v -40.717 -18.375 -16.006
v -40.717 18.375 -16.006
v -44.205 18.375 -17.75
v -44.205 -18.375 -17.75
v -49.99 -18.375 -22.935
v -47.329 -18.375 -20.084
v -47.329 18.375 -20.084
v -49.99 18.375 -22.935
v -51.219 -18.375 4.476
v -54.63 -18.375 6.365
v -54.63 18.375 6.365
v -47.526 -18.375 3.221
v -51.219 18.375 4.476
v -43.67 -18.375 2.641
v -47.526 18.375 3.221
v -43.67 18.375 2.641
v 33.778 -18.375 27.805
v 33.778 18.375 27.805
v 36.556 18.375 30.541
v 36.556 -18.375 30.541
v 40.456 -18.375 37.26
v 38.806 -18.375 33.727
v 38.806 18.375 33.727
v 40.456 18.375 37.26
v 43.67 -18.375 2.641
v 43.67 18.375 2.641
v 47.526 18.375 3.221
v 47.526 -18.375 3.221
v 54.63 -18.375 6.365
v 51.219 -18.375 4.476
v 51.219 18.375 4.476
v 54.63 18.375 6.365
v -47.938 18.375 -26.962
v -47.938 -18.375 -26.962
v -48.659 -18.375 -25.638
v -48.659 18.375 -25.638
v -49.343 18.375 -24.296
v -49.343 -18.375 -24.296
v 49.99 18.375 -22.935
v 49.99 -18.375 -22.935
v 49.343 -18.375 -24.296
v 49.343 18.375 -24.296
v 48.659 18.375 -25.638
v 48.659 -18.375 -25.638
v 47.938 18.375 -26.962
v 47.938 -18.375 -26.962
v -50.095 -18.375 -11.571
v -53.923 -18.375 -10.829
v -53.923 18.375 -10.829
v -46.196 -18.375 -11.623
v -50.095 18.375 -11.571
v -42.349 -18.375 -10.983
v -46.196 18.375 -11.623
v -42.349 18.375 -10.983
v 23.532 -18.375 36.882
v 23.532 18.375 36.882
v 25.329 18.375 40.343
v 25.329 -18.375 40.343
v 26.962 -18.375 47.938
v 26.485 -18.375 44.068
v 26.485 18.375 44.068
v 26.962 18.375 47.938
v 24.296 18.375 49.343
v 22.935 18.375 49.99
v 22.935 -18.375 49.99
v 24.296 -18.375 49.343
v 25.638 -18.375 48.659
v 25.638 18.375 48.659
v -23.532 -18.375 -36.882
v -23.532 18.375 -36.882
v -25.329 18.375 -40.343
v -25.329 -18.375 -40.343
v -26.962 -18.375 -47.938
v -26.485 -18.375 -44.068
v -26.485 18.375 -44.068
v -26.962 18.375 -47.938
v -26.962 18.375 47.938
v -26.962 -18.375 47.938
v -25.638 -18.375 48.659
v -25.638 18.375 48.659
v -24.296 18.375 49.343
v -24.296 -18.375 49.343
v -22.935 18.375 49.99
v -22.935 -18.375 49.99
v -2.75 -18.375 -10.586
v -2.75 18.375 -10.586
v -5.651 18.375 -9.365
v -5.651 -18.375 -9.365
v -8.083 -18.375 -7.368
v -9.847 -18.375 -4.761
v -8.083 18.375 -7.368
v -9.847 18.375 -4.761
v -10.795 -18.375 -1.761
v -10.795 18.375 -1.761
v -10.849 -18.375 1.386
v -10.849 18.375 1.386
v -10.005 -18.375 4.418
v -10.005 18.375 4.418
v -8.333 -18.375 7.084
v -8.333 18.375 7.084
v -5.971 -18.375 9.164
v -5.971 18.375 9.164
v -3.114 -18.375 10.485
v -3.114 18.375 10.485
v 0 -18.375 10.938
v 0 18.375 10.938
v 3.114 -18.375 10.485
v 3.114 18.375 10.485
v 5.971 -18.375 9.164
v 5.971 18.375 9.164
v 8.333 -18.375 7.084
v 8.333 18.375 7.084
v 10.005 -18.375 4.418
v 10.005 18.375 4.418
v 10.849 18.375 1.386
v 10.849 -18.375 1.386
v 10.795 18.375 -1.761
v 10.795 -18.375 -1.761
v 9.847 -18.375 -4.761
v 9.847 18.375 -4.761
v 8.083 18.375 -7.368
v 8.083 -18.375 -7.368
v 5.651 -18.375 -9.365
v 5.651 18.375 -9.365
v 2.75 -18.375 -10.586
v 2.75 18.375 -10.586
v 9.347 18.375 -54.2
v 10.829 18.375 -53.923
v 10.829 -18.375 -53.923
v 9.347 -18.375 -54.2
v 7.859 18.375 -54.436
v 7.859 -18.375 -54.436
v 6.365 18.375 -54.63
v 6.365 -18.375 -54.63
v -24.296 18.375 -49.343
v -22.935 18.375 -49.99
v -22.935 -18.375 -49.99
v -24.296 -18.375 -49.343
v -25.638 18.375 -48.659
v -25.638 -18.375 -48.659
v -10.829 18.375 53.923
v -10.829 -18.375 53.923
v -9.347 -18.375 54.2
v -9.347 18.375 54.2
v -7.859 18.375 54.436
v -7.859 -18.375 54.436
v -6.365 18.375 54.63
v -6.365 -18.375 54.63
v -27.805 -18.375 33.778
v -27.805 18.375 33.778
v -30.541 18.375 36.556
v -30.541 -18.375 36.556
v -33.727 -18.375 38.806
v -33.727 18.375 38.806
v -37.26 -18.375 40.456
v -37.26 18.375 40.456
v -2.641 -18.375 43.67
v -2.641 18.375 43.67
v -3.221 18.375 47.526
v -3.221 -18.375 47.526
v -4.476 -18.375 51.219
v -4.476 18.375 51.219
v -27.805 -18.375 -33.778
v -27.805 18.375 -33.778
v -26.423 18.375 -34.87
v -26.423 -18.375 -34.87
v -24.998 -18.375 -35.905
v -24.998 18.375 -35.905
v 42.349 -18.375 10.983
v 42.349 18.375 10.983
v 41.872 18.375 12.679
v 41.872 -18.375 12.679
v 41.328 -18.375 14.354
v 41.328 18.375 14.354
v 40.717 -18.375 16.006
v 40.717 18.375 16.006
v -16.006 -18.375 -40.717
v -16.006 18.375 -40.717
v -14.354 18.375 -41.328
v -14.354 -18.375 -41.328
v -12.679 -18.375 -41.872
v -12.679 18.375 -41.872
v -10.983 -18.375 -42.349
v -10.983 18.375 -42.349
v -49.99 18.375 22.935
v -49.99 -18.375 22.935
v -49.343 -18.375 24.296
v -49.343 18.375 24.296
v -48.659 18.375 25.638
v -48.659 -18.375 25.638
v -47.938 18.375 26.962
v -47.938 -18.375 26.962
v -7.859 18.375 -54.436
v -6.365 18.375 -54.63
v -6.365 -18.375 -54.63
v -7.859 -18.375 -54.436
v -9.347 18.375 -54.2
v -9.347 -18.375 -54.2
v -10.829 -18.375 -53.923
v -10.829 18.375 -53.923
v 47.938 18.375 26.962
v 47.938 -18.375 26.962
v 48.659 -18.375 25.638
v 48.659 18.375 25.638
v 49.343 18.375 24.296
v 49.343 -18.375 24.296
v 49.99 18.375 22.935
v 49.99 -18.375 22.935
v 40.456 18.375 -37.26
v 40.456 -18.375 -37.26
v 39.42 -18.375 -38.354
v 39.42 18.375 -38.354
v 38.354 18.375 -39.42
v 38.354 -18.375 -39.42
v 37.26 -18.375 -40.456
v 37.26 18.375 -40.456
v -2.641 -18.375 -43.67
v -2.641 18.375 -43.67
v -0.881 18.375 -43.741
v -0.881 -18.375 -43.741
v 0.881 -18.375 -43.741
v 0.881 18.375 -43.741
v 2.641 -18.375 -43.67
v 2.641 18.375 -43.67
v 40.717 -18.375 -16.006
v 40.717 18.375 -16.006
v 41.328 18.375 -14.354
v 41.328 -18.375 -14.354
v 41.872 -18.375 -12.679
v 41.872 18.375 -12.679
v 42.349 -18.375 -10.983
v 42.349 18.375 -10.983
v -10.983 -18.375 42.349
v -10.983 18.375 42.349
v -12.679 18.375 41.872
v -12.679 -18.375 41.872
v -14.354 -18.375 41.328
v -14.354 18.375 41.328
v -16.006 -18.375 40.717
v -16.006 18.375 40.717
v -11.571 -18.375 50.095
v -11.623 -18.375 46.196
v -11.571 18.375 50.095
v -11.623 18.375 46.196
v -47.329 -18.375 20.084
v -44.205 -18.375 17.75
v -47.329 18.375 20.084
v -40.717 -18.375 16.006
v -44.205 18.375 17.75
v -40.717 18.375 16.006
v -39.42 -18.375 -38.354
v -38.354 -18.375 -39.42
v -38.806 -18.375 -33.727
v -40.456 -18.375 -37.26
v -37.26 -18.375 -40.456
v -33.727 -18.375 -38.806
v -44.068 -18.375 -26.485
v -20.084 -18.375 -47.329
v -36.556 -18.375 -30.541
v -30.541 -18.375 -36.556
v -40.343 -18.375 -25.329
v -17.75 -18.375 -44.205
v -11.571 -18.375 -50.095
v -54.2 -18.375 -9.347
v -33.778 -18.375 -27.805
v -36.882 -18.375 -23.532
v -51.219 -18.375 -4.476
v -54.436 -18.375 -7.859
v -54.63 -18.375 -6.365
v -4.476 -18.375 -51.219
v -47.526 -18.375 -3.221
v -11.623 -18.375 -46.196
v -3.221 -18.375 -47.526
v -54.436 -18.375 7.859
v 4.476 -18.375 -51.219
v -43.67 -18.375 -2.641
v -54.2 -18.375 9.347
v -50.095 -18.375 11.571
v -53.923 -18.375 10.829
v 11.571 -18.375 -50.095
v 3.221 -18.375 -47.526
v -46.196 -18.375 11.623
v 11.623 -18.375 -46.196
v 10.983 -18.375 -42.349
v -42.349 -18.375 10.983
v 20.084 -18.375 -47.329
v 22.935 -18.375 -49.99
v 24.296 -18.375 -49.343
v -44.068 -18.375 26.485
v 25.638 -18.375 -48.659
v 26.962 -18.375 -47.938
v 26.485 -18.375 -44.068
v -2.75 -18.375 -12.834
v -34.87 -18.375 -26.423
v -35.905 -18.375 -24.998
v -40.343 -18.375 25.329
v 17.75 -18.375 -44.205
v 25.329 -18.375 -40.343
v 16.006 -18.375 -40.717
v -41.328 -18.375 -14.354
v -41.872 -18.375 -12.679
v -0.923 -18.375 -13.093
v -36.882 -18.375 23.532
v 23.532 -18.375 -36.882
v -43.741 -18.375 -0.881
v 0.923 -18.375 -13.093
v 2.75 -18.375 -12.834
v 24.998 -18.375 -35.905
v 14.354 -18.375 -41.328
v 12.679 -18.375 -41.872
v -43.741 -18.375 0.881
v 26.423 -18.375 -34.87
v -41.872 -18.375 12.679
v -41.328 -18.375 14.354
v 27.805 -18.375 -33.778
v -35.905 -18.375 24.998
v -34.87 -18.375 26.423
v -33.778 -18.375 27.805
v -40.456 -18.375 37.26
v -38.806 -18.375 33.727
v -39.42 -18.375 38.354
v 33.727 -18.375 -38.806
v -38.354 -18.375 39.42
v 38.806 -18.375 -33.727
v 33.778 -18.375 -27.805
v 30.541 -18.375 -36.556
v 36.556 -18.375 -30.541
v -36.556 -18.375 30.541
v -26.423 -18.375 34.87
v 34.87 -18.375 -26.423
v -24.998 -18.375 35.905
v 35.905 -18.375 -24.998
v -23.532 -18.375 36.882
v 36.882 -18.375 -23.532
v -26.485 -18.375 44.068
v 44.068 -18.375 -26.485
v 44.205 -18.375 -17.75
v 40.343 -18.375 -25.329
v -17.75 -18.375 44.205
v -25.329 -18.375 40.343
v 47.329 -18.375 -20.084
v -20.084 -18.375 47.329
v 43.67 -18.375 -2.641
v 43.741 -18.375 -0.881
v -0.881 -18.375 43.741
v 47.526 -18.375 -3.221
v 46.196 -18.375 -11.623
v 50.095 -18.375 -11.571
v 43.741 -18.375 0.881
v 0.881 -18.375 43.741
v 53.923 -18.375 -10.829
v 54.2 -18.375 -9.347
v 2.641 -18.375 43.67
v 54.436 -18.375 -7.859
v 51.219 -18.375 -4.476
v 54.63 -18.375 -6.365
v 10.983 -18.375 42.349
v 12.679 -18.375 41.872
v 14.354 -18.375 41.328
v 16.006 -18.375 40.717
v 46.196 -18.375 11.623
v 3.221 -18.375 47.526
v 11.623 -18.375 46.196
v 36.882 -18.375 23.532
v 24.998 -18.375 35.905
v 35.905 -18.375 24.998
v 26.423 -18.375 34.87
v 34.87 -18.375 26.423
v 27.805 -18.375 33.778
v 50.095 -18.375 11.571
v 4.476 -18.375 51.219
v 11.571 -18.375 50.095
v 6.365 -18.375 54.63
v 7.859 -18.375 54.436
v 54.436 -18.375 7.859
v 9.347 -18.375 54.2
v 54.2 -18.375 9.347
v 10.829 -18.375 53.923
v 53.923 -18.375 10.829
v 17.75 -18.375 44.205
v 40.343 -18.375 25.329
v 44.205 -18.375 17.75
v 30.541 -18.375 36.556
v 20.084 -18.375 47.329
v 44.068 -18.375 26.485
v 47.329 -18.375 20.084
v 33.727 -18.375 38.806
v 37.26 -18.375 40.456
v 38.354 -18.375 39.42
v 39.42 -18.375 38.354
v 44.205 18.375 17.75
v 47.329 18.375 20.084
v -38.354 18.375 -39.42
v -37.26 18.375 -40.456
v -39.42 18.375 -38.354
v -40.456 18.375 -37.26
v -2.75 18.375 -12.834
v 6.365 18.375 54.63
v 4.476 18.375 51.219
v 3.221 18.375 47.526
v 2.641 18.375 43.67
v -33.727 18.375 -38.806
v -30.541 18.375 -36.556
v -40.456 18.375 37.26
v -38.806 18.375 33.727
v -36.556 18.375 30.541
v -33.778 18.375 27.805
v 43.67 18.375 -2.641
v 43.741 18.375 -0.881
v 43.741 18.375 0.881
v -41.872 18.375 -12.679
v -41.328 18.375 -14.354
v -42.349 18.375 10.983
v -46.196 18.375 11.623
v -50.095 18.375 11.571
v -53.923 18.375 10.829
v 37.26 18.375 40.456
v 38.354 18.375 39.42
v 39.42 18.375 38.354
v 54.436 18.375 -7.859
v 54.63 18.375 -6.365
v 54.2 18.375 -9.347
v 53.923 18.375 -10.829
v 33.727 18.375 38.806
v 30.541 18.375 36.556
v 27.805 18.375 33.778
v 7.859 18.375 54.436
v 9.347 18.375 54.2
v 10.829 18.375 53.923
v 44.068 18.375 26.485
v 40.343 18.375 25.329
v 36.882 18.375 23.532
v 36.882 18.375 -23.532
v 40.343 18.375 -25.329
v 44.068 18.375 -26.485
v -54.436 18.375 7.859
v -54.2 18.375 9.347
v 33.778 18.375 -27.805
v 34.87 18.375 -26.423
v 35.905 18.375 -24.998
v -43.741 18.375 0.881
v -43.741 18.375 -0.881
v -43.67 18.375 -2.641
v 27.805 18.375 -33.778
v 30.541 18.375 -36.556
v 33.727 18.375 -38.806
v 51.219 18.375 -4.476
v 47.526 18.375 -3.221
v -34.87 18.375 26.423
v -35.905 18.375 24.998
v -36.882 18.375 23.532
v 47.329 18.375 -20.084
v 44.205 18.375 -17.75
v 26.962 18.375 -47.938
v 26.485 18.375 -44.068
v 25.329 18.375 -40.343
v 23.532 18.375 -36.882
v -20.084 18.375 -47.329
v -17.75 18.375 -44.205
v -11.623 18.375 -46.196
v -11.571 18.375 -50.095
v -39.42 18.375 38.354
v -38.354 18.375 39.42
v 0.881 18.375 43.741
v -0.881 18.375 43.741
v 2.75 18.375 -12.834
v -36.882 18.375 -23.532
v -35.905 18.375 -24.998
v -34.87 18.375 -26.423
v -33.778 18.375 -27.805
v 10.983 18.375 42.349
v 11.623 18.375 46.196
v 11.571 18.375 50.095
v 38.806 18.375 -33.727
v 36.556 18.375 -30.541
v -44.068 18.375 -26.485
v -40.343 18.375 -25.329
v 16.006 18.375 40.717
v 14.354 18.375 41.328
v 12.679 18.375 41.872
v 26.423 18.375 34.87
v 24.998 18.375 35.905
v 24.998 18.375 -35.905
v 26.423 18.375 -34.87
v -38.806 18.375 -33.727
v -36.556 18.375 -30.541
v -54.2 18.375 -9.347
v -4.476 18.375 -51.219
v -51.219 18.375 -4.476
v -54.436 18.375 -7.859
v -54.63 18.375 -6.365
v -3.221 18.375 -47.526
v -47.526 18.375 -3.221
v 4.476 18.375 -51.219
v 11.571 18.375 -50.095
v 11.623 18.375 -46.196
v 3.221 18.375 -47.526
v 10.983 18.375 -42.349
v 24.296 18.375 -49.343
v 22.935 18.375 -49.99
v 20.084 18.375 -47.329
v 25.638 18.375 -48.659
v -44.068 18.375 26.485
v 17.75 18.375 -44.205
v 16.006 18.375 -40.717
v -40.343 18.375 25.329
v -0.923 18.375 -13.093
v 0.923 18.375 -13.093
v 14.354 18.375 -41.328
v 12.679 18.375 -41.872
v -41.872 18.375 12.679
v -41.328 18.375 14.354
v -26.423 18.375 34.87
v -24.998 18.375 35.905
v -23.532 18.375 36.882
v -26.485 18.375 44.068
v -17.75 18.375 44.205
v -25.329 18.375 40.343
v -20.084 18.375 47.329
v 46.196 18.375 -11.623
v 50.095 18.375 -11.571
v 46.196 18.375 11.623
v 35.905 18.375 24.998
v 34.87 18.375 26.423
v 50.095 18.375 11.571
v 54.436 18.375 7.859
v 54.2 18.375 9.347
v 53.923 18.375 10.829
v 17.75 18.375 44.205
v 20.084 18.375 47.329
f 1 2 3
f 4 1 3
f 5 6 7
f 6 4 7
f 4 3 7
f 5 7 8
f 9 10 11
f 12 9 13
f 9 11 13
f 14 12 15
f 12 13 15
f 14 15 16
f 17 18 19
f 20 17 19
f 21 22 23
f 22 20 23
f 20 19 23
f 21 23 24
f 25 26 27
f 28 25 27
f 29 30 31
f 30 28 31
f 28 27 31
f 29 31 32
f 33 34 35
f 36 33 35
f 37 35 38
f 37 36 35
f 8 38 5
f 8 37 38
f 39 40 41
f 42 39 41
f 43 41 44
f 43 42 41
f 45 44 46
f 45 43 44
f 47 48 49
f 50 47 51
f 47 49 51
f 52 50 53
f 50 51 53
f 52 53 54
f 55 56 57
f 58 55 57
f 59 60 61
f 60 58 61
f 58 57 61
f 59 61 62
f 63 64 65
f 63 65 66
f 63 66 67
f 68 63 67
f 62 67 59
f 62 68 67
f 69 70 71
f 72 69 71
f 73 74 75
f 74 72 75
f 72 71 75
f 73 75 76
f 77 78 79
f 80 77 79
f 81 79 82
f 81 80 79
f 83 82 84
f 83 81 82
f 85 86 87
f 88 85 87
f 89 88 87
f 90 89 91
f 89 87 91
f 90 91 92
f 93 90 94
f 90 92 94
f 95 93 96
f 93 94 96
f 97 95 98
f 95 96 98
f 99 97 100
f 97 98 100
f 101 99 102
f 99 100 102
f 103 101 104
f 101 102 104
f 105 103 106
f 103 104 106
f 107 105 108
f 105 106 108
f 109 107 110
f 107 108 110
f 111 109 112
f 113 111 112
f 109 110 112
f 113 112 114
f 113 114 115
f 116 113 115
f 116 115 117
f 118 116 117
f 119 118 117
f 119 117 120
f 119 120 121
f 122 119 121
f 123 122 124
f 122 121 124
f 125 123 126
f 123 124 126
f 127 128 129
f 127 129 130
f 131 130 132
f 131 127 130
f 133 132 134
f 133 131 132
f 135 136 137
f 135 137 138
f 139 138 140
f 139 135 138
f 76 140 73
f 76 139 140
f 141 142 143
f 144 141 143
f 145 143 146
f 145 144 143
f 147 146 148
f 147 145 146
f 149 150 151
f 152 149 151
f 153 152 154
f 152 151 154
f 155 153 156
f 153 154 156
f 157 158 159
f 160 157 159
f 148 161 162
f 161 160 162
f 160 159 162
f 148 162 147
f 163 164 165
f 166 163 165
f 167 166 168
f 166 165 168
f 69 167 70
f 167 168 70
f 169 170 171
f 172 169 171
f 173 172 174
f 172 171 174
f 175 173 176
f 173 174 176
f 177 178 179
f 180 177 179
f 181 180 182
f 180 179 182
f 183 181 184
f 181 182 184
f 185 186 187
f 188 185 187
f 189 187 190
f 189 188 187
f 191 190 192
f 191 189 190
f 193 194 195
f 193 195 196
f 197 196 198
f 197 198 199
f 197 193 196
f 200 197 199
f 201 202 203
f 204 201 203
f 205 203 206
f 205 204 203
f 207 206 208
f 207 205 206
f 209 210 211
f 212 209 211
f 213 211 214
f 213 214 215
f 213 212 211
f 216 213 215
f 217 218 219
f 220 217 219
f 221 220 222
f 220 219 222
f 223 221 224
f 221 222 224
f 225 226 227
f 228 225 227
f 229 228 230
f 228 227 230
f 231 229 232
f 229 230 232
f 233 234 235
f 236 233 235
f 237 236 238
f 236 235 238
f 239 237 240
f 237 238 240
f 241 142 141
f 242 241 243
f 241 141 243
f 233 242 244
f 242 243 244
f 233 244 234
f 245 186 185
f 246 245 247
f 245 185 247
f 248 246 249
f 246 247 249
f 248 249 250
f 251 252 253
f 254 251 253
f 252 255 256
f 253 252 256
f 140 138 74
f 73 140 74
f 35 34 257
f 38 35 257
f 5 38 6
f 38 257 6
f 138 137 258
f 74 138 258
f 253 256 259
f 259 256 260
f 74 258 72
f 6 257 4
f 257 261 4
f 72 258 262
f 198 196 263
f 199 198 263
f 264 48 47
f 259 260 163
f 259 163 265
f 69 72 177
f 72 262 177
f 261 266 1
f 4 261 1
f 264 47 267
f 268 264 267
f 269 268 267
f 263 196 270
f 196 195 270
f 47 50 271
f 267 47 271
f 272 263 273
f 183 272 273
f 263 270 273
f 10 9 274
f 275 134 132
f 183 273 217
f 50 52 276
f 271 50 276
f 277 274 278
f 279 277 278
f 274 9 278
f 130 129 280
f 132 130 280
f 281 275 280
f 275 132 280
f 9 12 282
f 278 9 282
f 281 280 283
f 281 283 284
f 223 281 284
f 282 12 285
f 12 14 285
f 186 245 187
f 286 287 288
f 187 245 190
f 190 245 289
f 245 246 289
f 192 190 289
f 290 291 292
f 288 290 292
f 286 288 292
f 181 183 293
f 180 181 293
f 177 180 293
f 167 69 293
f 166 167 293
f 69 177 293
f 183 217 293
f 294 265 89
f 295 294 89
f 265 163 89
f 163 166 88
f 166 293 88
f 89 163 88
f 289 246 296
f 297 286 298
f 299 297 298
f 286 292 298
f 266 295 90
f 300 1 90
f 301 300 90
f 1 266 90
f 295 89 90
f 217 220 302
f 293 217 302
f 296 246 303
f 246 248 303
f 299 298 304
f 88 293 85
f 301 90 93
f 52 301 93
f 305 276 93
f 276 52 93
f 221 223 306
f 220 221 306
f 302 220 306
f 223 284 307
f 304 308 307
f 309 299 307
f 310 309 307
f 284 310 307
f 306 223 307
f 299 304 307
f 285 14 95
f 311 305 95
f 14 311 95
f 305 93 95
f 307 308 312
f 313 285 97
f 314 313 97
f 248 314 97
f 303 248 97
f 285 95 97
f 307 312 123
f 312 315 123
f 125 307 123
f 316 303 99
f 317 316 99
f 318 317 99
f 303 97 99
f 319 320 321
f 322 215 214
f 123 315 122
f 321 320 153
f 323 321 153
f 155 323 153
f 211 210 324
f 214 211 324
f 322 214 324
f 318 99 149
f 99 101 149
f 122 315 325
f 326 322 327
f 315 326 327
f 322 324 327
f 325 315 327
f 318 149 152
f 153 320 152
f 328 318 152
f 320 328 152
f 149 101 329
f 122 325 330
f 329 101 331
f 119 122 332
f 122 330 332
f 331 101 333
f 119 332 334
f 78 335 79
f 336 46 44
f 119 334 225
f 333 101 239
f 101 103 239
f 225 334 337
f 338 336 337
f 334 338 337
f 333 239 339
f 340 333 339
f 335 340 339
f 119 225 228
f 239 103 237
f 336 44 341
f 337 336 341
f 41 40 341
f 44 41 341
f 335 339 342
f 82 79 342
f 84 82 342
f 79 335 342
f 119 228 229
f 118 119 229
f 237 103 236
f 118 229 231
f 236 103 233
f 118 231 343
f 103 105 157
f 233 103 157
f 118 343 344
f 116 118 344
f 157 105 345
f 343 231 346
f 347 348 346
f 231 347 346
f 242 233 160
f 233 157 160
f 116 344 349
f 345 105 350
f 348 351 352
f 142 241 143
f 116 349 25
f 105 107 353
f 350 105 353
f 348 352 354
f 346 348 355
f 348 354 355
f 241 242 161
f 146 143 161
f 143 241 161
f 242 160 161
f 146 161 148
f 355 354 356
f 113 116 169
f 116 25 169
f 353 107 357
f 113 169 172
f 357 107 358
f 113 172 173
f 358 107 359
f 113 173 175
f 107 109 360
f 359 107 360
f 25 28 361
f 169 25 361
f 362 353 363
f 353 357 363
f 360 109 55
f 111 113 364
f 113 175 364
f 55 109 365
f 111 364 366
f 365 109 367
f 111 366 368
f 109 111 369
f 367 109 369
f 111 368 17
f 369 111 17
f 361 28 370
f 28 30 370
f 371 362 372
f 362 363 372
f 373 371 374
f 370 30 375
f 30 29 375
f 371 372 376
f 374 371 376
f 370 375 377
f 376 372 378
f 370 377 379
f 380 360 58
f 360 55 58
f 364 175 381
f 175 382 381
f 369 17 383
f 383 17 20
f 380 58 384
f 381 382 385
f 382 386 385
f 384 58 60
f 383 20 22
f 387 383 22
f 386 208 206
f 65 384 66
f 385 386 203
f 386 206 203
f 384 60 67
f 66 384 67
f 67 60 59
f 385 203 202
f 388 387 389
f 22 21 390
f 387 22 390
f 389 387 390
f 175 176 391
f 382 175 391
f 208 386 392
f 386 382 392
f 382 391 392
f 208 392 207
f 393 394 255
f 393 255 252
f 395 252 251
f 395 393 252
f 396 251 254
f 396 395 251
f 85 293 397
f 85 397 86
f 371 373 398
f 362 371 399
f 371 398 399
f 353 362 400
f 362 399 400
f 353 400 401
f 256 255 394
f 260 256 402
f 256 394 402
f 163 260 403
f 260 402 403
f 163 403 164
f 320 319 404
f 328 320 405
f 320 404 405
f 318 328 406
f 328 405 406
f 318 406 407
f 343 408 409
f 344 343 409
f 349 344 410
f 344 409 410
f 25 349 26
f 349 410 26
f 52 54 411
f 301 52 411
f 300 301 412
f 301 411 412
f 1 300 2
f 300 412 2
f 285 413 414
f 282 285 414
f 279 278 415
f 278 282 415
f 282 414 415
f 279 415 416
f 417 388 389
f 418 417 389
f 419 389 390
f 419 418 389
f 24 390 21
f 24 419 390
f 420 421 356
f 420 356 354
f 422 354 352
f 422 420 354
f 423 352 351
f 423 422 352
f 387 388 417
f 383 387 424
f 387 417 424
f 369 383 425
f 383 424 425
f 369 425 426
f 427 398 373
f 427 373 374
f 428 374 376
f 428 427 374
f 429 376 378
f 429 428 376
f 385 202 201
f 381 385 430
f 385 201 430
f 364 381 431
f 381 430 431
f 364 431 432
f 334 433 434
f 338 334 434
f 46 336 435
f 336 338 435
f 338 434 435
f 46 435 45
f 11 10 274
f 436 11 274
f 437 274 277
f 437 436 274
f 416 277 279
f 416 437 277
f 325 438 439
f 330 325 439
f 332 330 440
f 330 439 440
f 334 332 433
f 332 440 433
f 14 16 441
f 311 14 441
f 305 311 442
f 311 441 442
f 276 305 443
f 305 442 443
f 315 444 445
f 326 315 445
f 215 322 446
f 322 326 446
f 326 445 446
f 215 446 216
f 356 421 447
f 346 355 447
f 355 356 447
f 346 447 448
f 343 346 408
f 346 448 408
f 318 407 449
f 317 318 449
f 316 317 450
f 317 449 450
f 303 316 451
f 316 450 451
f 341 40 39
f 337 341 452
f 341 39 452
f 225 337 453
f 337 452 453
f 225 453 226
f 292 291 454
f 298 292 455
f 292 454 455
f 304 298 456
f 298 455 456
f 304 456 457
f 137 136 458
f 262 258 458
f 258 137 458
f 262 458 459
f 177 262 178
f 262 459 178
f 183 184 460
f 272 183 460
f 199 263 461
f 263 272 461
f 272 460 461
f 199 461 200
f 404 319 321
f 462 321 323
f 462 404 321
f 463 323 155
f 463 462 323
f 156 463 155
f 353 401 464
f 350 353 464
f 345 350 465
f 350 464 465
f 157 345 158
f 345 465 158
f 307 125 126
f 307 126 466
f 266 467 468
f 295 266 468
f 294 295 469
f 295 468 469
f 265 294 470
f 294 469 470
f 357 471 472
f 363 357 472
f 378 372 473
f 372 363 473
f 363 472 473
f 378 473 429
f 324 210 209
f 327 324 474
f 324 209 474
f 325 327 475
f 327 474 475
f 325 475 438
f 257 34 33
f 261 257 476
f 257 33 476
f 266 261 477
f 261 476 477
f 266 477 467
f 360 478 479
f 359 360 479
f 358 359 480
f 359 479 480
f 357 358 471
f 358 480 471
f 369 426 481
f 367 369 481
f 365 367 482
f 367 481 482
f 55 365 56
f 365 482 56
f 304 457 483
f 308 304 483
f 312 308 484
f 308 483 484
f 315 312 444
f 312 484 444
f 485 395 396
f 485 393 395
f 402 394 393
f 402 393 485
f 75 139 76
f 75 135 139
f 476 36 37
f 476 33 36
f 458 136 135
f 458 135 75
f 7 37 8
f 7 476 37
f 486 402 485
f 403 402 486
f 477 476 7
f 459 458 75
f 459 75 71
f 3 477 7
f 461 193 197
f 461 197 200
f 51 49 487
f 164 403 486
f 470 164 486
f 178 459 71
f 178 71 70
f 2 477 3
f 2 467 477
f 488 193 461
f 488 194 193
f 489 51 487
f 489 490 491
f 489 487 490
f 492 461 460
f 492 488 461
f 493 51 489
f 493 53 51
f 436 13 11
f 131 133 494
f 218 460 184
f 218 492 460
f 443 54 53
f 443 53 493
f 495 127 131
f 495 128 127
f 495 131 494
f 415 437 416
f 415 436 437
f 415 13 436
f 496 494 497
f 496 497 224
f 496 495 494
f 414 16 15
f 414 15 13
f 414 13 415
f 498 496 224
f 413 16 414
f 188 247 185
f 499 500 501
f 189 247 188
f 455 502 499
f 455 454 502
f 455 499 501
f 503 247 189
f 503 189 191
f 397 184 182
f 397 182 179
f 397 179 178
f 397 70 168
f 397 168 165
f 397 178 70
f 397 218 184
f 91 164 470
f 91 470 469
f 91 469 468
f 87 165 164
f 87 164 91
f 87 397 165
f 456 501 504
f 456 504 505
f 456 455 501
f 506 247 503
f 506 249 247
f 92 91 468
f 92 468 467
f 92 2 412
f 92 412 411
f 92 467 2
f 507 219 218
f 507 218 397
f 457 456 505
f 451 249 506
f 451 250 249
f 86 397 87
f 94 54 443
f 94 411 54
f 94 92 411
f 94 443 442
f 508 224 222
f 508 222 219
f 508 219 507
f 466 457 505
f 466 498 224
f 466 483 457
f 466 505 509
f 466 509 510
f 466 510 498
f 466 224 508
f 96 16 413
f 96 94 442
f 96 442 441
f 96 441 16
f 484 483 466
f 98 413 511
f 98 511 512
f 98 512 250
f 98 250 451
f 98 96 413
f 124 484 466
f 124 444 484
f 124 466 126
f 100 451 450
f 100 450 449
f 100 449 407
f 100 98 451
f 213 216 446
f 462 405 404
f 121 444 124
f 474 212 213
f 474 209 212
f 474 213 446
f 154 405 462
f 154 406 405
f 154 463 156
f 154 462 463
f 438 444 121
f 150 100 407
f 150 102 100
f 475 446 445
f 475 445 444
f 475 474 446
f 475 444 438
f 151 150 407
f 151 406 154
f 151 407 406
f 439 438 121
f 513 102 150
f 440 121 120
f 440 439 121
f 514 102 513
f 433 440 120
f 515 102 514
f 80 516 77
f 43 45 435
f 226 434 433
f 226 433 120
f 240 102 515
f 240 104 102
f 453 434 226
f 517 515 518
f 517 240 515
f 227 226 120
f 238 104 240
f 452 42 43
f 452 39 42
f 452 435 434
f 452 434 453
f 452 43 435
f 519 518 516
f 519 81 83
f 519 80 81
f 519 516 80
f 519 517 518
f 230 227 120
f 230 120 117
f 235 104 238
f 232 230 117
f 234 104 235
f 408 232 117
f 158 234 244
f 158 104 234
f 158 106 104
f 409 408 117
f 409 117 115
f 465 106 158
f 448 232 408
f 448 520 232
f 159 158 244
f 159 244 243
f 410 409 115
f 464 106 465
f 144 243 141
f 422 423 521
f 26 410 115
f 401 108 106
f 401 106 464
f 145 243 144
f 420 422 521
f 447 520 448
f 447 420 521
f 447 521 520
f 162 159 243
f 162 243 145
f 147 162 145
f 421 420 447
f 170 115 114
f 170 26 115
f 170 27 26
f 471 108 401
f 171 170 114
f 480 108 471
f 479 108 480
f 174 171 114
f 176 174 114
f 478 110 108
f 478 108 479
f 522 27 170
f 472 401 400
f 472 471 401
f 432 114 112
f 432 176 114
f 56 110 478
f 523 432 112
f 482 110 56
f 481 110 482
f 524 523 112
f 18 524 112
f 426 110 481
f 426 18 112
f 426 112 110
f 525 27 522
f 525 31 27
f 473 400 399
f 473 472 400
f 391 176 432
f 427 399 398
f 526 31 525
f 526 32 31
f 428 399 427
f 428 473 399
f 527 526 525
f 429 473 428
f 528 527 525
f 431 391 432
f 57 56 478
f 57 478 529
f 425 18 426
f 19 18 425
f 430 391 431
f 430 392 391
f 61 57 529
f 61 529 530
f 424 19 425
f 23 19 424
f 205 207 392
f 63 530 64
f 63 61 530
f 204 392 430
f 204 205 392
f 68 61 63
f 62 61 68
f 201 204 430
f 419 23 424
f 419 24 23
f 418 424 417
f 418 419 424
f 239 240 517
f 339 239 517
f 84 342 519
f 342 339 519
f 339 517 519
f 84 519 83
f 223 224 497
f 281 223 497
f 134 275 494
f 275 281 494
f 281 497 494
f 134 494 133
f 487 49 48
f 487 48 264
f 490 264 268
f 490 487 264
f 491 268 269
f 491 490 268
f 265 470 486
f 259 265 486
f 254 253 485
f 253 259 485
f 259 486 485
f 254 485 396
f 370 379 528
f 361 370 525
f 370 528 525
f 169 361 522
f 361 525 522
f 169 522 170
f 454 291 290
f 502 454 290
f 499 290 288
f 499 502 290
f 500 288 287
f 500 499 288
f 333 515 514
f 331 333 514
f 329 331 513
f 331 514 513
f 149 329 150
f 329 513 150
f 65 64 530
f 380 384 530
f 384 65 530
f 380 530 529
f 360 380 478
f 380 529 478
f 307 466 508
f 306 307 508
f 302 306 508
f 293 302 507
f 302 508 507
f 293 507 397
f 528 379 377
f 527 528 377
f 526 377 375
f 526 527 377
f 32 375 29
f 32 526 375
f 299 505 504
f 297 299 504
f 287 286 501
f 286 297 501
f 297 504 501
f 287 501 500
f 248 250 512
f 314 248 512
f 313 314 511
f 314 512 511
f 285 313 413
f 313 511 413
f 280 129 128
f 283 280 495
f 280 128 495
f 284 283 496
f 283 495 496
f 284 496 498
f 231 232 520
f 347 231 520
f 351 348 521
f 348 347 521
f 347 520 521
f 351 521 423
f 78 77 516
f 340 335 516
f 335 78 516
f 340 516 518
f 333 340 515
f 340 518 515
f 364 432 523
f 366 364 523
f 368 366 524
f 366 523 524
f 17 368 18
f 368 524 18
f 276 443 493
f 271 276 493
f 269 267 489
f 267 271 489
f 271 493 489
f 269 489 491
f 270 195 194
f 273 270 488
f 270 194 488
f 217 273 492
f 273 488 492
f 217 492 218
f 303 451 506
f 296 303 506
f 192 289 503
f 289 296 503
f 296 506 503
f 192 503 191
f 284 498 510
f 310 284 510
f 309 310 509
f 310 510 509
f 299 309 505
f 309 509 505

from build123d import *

# Parameters (mm, degrees)
IZIM4_R                     = 55
Y_KSEKLIK_EKSTR_ZYON1_DEPTH = 18.375
KES_EKSTR_ZYON2_DEPTH       = 25
DAIRESEL_KAPLAMA2_COUNT     = 20
KES_EKSTR_ZYON3_DEPTH       = 36.75


with BuildPart() as part:
    # Çizim4 → Yükseklik-Ekstrüzyon1 (new, symmetric)
    with BuildSketch(Plane(origin=(0, 0, 0), x_dir=(1, 0, 0), z_dir=(0, 1, 0))):
        with Locations(Location((0, 0, 0), (0, 0, 270))):
            Circle(IZIM4_R)
    extrude(amount=Y_KSEKLIK_EKSTR_ZYON1_DEPTH, both=True)

    # Çizim2 → Kes-Ekstrüzyon2 (cut, symmetric)
    with BuildSketch(Plane(origin=(0, 0, 0), x_dir=(1, 0, 0), z_dir=(0, 1, 0))):
        with BuildLine():
            ThreePointArc((6.364657179, 54.630496419), (0, 55), (-6.364657179, 54.630496419))
            ThreePointArc((-6.364657179, 54.630496419), (-3.766285823, 49.400564339), (-2.640650949, 43.670235431))
            ThreePointArc((-2.640650949, 43.670235431), (0, 43.75), (2.640650949, 43.670235431))
            ThreePointArc((2.640650949, 43.670235431), (3.766285823, 49.400564339), (6.364657179, 54.630496419))
        make_face()
    kes_ekstr_zyon2 = extrude(amount=KES_EKSTR_ZYON2_DEPTH, both=True, mode=Mode.SUBTRACT)

    # Dairesel Kaplama2: Kes-Ekstrüzyon2 ×20 about axis
    dairesel_kaplama2_axis = Axis((0, 0, 0), (0, 1, 0))
    for i in range(1, DAIRESEL_KAPLAMA2_COUNT):
        add(kes_ekstr_zyon2.rotate(dairesel_kaplama2_axis, i * 360 / DAIRESEL_KAPLAMA2_COUNT), mode=Mode.SUBTRACT)

    # Çizim9 → Kes-Ekstrüzyon3 (cut)
    with BuildSketch(Plane(origin=(0, 18.375, 0), x_dir=(1, 0, 0), z_dir=(0, 1, 0))):
        with BuildLine():
            Line((2.75, 10.58614218), (2.75, 12.833671532))
            ThreePointArc((2.75, 12.833671532), (0, 13.125), (-2.75, 12.833671532))
            Line((-2.75, 12.833671532), (-2.75, 10.58614218))
            ThreePointArc((-2.75, 10.58614218), (0, -10.9375), (2.75, 10.58614218))
        make_face()
    extrude(amount=-KES_EKSTR_ZYON3_DEPTH, mode=Mode.SUBTRACT)


solid = part.part
